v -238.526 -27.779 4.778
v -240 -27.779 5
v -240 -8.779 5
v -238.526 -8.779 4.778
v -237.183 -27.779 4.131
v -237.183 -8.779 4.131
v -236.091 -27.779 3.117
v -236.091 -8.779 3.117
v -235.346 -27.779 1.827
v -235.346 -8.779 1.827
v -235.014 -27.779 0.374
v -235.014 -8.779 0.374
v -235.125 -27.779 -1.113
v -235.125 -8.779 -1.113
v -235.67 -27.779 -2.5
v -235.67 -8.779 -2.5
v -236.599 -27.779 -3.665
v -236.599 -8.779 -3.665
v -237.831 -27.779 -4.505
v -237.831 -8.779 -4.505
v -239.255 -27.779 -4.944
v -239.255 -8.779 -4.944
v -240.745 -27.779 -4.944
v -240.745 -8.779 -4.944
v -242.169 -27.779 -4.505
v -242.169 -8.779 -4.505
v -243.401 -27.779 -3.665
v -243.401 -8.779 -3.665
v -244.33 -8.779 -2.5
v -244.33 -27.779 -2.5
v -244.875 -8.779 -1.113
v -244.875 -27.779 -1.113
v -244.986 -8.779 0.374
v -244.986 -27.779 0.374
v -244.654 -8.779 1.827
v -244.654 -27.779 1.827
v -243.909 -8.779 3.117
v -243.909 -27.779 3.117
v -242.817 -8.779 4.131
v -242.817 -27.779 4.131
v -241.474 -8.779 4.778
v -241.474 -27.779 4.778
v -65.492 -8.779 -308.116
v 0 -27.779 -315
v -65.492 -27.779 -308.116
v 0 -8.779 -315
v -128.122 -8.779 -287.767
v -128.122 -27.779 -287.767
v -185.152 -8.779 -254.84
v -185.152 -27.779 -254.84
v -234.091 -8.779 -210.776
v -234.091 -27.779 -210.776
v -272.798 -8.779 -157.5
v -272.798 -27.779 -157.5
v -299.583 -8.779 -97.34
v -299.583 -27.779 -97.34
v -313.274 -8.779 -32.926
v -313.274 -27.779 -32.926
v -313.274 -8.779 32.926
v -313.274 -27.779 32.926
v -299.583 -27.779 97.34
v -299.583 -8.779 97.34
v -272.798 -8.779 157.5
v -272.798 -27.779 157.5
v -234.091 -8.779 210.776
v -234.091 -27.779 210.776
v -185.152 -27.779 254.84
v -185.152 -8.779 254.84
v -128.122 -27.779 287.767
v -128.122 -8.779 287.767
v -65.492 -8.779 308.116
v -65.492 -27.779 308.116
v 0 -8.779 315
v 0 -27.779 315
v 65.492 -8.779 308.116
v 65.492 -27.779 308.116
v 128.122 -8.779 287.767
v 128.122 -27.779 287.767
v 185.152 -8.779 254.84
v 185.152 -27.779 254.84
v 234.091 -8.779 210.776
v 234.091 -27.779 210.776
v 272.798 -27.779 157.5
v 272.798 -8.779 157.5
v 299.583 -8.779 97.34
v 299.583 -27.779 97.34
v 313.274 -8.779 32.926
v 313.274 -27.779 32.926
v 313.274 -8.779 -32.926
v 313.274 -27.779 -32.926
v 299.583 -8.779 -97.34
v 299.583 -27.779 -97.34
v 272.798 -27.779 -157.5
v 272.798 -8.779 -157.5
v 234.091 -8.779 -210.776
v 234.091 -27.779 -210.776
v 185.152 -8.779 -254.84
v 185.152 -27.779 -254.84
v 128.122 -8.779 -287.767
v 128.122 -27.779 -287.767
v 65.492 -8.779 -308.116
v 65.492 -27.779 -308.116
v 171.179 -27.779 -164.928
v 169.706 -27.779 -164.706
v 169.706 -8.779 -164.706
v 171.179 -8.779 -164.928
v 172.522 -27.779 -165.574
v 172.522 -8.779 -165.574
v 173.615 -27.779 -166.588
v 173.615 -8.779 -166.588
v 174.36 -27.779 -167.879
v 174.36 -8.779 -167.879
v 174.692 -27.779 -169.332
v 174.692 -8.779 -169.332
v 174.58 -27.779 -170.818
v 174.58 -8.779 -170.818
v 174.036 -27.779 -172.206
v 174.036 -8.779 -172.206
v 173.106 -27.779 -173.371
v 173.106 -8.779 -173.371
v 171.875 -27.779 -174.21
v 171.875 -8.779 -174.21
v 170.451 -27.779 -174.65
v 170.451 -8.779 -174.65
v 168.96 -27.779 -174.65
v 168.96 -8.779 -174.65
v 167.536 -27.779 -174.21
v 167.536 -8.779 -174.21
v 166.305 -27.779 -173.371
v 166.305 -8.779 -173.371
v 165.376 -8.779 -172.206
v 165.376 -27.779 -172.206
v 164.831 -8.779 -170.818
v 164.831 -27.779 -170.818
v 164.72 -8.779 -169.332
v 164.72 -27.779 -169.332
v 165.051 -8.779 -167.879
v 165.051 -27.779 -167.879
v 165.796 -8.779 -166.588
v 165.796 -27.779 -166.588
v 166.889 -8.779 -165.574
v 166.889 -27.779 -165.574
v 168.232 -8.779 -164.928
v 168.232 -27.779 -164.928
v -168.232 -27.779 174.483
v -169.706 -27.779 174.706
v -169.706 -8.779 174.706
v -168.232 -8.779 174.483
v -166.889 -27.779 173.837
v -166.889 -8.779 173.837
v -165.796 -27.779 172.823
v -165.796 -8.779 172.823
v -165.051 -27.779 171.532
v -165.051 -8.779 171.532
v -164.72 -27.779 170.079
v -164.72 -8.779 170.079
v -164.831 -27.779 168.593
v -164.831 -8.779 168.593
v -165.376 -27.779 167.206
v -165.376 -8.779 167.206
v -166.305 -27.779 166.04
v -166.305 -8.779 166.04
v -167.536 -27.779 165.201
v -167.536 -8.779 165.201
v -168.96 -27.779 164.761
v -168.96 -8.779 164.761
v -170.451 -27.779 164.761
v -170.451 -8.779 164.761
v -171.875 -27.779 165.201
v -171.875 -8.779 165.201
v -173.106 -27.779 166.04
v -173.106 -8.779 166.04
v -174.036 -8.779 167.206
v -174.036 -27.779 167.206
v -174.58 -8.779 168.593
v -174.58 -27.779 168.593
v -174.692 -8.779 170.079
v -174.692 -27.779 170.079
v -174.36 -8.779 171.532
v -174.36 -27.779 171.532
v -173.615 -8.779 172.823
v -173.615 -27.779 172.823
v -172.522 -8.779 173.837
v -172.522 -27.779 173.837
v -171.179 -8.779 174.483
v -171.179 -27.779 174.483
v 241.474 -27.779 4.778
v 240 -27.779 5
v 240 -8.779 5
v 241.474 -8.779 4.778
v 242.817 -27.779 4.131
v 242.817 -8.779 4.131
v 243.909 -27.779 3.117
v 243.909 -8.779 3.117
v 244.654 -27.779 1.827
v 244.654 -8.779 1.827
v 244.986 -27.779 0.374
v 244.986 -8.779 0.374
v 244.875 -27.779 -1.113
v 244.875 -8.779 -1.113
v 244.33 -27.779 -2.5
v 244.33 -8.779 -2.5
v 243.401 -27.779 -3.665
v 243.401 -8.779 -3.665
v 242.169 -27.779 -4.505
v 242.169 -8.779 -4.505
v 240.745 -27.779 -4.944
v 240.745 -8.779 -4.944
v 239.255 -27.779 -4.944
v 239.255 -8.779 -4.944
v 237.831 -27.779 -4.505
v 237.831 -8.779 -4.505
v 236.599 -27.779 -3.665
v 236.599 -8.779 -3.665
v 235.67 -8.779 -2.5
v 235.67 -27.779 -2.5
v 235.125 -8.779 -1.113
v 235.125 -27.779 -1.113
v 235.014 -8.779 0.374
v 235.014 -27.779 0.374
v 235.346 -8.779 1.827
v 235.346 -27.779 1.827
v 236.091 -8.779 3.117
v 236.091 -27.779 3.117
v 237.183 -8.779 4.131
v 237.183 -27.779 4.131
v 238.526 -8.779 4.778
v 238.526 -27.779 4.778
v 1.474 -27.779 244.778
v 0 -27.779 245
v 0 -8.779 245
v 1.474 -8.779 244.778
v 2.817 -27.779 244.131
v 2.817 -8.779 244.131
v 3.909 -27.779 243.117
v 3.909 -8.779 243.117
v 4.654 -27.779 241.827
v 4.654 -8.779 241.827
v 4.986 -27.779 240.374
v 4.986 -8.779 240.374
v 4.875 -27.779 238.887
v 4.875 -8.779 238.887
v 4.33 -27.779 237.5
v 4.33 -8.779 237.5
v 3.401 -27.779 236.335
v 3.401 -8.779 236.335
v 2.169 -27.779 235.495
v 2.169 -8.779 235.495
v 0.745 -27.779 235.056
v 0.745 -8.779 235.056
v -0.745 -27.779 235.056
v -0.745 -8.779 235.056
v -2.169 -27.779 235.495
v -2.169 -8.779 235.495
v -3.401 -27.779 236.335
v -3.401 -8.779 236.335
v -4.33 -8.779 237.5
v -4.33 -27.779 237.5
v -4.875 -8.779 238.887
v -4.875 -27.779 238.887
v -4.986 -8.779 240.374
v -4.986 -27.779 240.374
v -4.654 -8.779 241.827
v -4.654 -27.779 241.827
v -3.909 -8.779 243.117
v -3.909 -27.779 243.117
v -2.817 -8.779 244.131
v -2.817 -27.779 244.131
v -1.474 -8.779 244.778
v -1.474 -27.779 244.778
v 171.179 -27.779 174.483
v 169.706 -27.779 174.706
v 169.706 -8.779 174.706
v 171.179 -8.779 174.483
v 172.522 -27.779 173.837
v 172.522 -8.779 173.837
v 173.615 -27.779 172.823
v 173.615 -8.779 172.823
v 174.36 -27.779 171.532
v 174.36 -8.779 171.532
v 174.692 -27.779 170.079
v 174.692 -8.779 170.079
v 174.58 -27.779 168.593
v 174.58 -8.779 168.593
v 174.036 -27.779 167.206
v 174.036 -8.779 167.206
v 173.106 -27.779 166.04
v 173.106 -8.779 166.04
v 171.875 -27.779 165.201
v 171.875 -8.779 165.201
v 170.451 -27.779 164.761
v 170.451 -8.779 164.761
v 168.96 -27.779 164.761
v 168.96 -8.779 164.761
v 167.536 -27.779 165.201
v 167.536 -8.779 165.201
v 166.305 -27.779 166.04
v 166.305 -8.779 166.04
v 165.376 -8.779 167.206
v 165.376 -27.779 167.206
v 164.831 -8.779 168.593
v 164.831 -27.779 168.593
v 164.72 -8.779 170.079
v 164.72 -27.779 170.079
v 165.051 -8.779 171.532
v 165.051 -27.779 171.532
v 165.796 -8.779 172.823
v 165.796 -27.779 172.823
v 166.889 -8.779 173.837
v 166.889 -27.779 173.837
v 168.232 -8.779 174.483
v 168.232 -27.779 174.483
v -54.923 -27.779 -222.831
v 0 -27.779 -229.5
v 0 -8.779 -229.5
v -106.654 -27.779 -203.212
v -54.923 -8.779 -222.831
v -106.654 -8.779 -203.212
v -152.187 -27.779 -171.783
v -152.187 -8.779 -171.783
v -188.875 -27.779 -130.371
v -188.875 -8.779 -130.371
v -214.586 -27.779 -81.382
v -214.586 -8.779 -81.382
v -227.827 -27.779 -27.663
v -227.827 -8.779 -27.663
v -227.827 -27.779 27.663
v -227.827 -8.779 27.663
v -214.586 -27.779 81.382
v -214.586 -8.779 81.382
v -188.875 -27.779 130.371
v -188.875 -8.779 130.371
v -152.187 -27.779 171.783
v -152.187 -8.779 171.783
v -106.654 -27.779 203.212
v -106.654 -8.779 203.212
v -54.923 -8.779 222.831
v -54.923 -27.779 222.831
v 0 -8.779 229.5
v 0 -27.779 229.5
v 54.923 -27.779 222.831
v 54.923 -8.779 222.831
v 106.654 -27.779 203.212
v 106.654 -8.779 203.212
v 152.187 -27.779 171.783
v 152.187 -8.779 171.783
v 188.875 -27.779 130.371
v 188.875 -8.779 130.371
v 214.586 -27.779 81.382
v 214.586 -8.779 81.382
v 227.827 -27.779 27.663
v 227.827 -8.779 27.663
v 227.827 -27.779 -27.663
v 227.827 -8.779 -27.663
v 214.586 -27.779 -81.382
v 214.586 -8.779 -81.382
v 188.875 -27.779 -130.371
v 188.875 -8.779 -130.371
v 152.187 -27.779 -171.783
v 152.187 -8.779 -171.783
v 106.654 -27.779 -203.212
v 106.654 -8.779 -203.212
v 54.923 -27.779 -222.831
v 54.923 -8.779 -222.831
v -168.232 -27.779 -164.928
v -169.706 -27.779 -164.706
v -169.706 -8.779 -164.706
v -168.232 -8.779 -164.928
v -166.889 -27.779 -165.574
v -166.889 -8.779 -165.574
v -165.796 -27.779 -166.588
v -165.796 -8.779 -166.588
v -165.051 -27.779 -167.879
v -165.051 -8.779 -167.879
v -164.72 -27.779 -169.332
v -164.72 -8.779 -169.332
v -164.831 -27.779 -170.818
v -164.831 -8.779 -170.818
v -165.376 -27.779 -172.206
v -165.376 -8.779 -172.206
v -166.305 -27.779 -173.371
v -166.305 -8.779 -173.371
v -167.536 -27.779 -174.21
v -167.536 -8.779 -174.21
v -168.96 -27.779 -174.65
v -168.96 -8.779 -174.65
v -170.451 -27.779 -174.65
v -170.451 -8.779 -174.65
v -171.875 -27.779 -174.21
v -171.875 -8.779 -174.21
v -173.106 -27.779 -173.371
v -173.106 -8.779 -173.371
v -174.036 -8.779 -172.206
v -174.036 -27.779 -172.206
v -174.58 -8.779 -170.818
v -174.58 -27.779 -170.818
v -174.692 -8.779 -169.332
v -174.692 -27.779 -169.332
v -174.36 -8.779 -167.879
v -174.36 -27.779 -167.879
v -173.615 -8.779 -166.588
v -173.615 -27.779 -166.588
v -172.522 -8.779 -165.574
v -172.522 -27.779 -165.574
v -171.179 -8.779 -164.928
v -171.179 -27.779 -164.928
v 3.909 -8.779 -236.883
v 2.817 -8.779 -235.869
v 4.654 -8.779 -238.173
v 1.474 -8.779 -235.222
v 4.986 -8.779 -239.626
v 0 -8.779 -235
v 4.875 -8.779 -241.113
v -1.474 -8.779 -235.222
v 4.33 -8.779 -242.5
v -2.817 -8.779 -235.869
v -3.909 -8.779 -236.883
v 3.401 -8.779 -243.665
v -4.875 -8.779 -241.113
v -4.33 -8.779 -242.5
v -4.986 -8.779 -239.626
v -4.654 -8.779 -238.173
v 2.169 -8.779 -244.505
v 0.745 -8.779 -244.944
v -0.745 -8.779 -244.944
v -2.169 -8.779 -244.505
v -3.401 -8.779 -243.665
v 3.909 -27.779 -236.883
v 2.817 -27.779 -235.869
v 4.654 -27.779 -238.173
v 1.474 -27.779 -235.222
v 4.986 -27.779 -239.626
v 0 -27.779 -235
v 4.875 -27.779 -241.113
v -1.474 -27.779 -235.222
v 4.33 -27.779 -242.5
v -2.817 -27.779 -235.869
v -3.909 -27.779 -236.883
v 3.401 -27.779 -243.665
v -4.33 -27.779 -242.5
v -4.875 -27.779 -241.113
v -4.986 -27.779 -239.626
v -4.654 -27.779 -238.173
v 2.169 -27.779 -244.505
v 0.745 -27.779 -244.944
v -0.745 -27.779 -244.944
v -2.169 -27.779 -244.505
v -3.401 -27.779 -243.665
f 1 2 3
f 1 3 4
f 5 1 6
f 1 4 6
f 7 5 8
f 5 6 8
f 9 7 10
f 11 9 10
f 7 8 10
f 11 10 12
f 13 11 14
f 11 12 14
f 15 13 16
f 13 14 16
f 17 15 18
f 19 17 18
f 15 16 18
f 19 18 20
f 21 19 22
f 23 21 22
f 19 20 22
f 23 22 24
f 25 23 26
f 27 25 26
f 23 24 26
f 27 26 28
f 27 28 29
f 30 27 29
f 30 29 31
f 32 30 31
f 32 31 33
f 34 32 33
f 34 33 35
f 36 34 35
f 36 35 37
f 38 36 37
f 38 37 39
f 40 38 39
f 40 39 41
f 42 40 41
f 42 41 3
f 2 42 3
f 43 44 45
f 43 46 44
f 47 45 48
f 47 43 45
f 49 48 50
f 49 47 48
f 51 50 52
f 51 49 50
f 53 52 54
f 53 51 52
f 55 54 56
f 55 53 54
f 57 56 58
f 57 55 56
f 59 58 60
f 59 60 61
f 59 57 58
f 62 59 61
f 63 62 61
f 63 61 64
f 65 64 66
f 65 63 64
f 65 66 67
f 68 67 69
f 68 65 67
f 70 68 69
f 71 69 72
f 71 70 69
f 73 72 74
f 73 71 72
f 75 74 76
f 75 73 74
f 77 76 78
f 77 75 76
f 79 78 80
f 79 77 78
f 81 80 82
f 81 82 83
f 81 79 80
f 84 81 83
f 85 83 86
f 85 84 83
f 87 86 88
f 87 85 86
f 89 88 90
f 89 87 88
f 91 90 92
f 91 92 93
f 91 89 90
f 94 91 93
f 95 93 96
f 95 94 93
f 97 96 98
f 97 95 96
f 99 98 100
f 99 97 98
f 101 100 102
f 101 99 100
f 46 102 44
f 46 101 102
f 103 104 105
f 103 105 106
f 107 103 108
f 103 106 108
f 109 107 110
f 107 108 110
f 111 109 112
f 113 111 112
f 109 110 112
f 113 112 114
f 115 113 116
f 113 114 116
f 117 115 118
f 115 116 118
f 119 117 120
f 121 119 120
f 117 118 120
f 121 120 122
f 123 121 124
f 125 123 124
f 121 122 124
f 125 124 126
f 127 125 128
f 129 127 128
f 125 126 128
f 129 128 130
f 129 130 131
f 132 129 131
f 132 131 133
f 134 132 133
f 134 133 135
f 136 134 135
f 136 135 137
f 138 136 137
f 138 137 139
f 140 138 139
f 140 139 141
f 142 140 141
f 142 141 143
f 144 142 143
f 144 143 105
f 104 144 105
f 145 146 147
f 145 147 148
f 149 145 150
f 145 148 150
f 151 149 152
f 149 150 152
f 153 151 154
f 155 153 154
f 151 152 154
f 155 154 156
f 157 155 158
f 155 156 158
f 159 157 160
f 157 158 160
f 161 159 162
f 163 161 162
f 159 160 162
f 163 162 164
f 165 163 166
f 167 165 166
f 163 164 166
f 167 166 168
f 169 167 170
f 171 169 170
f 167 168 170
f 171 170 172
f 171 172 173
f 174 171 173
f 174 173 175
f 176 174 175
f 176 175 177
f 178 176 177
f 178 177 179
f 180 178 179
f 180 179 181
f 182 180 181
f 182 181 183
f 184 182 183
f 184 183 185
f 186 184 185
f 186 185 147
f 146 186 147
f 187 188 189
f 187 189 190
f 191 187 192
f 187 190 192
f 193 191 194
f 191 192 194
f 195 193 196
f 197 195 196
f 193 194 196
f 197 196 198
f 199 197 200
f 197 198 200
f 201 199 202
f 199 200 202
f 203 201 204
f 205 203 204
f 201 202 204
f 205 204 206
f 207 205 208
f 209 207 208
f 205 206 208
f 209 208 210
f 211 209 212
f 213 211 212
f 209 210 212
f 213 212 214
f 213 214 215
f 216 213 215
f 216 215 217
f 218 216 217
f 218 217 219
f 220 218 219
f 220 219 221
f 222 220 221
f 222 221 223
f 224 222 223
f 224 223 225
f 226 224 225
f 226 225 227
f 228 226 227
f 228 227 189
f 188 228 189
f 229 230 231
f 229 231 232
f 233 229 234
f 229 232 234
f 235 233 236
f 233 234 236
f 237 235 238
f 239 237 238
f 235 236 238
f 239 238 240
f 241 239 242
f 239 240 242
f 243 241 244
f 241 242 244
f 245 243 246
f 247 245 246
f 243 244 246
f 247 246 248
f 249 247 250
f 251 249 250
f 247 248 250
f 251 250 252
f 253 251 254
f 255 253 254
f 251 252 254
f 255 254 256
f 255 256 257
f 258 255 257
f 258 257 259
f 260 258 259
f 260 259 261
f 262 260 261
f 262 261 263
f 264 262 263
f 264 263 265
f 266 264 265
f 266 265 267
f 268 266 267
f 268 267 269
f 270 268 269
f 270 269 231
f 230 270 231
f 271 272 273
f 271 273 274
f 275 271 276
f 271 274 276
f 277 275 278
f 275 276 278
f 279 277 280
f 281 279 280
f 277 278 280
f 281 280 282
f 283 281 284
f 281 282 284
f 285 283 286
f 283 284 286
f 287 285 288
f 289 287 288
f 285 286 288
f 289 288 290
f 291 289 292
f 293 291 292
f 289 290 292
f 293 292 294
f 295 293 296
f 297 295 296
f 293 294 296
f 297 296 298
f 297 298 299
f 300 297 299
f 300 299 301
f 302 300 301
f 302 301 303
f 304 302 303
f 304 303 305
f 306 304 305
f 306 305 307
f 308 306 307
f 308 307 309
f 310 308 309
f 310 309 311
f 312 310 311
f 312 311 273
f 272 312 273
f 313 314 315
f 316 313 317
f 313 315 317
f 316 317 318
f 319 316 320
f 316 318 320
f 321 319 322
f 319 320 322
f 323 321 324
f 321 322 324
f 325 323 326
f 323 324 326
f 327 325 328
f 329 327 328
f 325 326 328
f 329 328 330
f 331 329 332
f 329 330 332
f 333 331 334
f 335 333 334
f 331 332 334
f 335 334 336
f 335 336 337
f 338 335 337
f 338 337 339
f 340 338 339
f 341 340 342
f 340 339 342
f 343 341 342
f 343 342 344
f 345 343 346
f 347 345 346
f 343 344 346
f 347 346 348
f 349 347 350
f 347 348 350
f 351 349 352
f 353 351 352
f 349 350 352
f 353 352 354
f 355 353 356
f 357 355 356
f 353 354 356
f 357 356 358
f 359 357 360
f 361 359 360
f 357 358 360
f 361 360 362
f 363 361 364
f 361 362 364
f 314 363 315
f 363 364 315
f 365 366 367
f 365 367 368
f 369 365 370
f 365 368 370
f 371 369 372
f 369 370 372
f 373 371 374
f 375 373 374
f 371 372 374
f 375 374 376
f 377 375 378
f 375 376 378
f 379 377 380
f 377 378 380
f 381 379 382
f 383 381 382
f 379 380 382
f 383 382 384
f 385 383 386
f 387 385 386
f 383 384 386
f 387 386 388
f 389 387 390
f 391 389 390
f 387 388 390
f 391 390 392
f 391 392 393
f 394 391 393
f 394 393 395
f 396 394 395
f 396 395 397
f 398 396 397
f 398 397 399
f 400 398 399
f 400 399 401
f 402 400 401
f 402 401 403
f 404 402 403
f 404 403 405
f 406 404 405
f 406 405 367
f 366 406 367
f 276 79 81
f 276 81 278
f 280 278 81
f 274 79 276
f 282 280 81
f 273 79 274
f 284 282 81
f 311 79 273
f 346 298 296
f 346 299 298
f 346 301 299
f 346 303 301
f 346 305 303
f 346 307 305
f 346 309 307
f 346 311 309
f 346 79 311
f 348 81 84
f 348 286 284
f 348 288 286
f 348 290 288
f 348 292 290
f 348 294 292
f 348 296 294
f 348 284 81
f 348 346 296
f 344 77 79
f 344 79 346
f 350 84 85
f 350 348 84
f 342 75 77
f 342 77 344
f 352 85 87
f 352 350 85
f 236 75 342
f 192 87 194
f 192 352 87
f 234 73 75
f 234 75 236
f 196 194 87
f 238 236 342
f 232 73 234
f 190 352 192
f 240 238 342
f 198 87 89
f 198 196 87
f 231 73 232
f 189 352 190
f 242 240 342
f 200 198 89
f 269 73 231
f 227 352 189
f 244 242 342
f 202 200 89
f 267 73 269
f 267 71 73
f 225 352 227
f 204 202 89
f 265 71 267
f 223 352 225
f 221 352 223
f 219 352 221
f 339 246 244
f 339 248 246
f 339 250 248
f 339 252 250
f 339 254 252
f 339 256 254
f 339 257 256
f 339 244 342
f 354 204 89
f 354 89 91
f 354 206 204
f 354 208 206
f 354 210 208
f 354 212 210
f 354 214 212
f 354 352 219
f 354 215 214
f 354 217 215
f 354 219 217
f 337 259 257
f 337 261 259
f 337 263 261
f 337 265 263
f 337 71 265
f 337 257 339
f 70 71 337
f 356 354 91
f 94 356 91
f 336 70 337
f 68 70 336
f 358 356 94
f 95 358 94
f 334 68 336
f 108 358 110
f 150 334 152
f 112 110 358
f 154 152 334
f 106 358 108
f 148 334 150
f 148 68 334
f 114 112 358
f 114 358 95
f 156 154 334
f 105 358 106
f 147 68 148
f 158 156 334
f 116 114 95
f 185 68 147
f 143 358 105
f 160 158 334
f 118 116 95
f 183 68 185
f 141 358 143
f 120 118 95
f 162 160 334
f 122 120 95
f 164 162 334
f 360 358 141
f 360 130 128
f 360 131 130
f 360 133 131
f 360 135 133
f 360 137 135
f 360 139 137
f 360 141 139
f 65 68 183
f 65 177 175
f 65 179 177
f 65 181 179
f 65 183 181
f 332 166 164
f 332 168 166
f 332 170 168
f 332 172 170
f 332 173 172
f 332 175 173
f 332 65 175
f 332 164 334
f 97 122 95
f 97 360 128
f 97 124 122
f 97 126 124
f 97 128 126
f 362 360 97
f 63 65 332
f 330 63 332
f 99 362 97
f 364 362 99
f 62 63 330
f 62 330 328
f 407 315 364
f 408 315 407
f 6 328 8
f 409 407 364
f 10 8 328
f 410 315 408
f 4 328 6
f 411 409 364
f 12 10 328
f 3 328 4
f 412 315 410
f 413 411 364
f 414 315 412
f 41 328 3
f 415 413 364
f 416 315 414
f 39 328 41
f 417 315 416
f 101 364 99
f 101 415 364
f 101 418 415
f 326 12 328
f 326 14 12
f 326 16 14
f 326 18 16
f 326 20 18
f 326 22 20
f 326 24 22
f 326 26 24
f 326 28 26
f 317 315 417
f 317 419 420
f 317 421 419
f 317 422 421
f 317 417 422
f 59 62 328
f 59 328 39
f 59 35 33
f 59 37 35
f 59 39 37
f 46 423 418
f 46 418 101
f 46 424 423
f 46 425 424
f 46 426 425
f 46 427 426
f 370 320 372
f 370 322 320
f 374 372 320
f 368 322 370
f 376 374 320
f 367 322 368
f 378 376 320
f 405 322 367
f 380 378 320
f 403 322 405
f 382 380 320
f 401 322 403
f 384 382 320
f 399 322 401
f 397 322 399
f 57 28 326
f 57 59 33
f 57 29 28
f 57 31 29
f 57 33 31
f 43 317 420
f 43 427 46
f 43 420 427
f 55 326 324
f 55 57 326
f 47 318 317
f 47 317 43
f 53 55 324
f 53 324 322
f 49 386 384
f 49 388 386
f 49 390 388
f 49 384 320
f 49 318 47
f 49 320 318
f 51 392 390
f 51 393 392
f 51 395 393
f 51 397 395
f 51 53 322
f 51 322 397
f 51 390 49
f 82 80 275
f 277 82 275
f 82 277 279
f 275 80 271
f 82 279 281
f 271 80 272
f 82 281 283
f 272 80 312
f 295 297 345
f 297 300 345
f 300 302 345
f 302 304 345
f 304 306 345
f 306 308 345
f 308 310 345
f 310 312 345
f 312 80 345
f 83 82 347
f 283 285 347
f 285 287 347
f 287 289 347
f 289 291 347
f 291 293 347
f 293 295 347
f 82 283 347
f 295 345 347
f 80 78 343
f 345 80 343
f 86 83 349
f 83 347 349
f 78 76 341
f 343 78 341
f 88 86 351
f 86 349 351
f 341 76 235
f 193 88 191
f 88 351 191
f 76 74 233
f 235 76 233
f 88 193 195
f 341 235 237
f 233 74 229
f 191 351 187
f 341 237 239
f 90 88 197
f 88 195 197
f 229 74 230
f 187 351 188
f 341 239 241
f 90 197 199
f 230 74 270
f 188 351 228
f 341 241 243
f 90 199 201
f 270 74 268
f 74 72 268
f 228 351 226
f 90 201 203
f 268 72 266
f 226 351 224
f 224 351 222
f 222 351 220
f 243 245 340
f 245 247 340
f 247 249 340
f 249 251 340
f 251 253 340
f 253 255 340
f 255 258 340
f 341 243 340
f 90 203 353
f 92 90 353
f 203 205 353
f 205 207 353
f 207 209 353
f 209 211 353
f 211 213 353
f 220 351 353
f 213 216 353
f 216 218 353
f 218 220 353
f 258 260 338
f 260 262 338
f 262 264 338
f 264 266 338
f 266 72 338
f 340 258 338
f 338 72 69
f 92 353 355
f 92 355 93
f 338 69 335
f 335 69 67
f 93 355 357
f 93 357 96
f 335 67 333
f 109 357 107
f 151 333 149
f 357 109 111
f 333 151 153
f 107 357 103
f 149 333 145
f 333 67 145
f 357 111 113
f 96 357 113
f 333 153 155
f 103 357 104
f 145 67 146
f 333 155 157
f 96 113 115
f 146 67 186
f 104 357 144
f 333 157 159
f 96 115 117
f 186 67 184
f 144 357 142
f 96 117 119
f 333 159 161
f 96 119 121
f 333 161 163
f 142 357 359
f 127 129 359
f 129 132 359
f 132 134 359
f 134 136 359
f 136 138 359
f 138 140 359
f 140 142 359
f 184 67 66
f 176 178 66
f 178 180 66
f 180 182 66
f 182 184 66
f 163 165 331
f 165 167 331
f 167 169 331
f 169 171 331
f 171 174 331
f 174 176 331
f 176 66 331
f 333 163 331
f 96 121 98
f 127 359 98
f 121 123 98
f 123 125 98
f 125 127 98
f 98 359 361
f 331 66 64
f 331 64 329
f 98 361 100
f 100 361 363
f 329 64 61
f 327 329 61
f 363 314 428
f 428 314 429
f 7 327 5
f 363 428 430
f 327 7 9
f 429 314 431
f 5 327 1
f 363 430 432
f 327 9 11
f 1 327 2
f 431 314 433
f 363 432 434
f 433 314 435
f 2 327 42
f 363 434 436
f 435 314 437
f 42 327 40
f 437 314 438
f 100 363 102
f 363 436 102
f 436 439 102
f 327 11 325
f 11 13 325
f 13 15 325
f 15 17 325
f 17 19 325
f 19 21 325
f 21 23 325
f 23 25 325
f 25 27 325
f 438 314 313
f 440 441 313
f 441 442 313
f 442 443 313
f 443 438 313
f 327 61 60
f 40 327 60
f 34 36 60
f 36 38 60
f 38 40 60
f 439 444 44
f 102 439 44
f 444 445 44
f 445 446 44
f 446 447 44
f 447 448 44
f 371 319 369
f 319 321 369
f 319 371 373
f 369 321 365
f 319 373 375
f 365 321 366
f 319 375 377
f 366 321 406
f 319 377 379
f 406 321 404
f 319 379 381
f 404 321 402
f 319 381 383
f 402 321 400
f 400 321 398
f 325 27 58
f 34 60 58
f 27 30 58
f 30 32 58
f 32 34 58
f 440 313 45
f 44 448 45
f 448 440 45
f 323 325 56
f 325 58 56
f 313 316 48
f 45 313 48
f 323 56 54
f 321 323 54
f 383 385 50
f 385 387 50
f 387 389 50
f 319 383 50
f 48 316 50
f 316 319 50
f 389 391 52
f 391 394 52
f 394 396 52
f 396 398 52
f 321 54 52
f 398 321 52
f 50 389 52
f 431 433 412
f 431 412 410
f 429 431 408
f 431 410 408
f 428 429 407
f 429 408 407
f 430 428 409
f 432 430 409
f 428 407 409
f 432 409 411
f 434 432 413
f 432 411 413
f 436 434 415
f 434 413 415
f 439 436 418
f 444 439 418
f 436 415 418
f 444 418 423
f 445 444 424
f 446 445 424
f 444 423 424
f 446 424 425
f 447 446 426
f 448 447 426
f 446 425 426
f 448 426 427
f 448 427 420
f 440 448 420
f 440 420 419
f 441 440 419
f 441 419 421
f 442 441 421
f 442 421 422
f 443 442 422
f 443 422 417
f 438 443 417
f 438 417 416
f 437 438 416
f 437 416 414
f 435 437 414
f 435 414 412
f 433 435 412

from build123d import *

# Parameters (mm, degrees)
SKETCH1_W          = 85.5
SKETCH1_H          = 19
SKETCH2_R          = 5
CUT_EXTRUDE1_DEPTH = 446.882271457


with BuildPart() as part:
    # Sketch1 → Revolve1 (revolve)
    with BuildSketch(Plane(origin=(0, 0, 0), x_dir=(0, 0, -1), z_dir=(1, 0, 0)), mode=Mode.PRIVATE) as revolve1_sk:
        with Locations((-272.25, -18.279378005)):
            Rectangle(SKETCH1_W, SKETCH1_H)
    revolve(revolve1_sk.sketch.rotate(Axis((0, -6970.88671751, 0), (0, 1, 0)), 180), axis=Axis((0, -6970.88671751, 0), (0, 1, 0)))

    # Sketch2 → Cut-Extrude1 (cut, through all)
    with BuildSketch(Plane(origin=(0, -8.779378005, 0), x_dir=(1, 0, 0), z_dir=(0, 1, 0))):
        with Locations(Location((0, 240, 0), (0, 0, 270))):
            Circle(SKETCH2_R)
        with Locations(Location((169.705627485, 169.705627485, 0), (0, 0, 270))):
            Circle(SKETCH2_R)
        with Locations(Location((240, 0, 0), (0, 0, 270))):
            Circle(SKETCH2_R)
        with Locations(Location((169.705627485, -169.705627485, 0), (0, 0, 270))):
            Circle(SKETCH2_R)
        with Locations(Location((0, -240, 0), (0, 0, 270))):
            Circle(SKETCH2_R)
        with Locations(Location((-169.705627485, -169.705627485, 0), (0, 0, 270))):
            Circle(SKETCH2_R)
        with Locations(Location((-240, 0, 0), (0, 0, 270))):
            Circle(SKETCH2_R)
        with Locations(Location((-169.705627485, 169.705627485, 0), (0, 0, 270))):
            Circle(SKETCH2_R)
    extrude(amount=-CUT_EXTRUDE1_DEPTH, mode=Mode.SUBTRACT)


solid = part.part
